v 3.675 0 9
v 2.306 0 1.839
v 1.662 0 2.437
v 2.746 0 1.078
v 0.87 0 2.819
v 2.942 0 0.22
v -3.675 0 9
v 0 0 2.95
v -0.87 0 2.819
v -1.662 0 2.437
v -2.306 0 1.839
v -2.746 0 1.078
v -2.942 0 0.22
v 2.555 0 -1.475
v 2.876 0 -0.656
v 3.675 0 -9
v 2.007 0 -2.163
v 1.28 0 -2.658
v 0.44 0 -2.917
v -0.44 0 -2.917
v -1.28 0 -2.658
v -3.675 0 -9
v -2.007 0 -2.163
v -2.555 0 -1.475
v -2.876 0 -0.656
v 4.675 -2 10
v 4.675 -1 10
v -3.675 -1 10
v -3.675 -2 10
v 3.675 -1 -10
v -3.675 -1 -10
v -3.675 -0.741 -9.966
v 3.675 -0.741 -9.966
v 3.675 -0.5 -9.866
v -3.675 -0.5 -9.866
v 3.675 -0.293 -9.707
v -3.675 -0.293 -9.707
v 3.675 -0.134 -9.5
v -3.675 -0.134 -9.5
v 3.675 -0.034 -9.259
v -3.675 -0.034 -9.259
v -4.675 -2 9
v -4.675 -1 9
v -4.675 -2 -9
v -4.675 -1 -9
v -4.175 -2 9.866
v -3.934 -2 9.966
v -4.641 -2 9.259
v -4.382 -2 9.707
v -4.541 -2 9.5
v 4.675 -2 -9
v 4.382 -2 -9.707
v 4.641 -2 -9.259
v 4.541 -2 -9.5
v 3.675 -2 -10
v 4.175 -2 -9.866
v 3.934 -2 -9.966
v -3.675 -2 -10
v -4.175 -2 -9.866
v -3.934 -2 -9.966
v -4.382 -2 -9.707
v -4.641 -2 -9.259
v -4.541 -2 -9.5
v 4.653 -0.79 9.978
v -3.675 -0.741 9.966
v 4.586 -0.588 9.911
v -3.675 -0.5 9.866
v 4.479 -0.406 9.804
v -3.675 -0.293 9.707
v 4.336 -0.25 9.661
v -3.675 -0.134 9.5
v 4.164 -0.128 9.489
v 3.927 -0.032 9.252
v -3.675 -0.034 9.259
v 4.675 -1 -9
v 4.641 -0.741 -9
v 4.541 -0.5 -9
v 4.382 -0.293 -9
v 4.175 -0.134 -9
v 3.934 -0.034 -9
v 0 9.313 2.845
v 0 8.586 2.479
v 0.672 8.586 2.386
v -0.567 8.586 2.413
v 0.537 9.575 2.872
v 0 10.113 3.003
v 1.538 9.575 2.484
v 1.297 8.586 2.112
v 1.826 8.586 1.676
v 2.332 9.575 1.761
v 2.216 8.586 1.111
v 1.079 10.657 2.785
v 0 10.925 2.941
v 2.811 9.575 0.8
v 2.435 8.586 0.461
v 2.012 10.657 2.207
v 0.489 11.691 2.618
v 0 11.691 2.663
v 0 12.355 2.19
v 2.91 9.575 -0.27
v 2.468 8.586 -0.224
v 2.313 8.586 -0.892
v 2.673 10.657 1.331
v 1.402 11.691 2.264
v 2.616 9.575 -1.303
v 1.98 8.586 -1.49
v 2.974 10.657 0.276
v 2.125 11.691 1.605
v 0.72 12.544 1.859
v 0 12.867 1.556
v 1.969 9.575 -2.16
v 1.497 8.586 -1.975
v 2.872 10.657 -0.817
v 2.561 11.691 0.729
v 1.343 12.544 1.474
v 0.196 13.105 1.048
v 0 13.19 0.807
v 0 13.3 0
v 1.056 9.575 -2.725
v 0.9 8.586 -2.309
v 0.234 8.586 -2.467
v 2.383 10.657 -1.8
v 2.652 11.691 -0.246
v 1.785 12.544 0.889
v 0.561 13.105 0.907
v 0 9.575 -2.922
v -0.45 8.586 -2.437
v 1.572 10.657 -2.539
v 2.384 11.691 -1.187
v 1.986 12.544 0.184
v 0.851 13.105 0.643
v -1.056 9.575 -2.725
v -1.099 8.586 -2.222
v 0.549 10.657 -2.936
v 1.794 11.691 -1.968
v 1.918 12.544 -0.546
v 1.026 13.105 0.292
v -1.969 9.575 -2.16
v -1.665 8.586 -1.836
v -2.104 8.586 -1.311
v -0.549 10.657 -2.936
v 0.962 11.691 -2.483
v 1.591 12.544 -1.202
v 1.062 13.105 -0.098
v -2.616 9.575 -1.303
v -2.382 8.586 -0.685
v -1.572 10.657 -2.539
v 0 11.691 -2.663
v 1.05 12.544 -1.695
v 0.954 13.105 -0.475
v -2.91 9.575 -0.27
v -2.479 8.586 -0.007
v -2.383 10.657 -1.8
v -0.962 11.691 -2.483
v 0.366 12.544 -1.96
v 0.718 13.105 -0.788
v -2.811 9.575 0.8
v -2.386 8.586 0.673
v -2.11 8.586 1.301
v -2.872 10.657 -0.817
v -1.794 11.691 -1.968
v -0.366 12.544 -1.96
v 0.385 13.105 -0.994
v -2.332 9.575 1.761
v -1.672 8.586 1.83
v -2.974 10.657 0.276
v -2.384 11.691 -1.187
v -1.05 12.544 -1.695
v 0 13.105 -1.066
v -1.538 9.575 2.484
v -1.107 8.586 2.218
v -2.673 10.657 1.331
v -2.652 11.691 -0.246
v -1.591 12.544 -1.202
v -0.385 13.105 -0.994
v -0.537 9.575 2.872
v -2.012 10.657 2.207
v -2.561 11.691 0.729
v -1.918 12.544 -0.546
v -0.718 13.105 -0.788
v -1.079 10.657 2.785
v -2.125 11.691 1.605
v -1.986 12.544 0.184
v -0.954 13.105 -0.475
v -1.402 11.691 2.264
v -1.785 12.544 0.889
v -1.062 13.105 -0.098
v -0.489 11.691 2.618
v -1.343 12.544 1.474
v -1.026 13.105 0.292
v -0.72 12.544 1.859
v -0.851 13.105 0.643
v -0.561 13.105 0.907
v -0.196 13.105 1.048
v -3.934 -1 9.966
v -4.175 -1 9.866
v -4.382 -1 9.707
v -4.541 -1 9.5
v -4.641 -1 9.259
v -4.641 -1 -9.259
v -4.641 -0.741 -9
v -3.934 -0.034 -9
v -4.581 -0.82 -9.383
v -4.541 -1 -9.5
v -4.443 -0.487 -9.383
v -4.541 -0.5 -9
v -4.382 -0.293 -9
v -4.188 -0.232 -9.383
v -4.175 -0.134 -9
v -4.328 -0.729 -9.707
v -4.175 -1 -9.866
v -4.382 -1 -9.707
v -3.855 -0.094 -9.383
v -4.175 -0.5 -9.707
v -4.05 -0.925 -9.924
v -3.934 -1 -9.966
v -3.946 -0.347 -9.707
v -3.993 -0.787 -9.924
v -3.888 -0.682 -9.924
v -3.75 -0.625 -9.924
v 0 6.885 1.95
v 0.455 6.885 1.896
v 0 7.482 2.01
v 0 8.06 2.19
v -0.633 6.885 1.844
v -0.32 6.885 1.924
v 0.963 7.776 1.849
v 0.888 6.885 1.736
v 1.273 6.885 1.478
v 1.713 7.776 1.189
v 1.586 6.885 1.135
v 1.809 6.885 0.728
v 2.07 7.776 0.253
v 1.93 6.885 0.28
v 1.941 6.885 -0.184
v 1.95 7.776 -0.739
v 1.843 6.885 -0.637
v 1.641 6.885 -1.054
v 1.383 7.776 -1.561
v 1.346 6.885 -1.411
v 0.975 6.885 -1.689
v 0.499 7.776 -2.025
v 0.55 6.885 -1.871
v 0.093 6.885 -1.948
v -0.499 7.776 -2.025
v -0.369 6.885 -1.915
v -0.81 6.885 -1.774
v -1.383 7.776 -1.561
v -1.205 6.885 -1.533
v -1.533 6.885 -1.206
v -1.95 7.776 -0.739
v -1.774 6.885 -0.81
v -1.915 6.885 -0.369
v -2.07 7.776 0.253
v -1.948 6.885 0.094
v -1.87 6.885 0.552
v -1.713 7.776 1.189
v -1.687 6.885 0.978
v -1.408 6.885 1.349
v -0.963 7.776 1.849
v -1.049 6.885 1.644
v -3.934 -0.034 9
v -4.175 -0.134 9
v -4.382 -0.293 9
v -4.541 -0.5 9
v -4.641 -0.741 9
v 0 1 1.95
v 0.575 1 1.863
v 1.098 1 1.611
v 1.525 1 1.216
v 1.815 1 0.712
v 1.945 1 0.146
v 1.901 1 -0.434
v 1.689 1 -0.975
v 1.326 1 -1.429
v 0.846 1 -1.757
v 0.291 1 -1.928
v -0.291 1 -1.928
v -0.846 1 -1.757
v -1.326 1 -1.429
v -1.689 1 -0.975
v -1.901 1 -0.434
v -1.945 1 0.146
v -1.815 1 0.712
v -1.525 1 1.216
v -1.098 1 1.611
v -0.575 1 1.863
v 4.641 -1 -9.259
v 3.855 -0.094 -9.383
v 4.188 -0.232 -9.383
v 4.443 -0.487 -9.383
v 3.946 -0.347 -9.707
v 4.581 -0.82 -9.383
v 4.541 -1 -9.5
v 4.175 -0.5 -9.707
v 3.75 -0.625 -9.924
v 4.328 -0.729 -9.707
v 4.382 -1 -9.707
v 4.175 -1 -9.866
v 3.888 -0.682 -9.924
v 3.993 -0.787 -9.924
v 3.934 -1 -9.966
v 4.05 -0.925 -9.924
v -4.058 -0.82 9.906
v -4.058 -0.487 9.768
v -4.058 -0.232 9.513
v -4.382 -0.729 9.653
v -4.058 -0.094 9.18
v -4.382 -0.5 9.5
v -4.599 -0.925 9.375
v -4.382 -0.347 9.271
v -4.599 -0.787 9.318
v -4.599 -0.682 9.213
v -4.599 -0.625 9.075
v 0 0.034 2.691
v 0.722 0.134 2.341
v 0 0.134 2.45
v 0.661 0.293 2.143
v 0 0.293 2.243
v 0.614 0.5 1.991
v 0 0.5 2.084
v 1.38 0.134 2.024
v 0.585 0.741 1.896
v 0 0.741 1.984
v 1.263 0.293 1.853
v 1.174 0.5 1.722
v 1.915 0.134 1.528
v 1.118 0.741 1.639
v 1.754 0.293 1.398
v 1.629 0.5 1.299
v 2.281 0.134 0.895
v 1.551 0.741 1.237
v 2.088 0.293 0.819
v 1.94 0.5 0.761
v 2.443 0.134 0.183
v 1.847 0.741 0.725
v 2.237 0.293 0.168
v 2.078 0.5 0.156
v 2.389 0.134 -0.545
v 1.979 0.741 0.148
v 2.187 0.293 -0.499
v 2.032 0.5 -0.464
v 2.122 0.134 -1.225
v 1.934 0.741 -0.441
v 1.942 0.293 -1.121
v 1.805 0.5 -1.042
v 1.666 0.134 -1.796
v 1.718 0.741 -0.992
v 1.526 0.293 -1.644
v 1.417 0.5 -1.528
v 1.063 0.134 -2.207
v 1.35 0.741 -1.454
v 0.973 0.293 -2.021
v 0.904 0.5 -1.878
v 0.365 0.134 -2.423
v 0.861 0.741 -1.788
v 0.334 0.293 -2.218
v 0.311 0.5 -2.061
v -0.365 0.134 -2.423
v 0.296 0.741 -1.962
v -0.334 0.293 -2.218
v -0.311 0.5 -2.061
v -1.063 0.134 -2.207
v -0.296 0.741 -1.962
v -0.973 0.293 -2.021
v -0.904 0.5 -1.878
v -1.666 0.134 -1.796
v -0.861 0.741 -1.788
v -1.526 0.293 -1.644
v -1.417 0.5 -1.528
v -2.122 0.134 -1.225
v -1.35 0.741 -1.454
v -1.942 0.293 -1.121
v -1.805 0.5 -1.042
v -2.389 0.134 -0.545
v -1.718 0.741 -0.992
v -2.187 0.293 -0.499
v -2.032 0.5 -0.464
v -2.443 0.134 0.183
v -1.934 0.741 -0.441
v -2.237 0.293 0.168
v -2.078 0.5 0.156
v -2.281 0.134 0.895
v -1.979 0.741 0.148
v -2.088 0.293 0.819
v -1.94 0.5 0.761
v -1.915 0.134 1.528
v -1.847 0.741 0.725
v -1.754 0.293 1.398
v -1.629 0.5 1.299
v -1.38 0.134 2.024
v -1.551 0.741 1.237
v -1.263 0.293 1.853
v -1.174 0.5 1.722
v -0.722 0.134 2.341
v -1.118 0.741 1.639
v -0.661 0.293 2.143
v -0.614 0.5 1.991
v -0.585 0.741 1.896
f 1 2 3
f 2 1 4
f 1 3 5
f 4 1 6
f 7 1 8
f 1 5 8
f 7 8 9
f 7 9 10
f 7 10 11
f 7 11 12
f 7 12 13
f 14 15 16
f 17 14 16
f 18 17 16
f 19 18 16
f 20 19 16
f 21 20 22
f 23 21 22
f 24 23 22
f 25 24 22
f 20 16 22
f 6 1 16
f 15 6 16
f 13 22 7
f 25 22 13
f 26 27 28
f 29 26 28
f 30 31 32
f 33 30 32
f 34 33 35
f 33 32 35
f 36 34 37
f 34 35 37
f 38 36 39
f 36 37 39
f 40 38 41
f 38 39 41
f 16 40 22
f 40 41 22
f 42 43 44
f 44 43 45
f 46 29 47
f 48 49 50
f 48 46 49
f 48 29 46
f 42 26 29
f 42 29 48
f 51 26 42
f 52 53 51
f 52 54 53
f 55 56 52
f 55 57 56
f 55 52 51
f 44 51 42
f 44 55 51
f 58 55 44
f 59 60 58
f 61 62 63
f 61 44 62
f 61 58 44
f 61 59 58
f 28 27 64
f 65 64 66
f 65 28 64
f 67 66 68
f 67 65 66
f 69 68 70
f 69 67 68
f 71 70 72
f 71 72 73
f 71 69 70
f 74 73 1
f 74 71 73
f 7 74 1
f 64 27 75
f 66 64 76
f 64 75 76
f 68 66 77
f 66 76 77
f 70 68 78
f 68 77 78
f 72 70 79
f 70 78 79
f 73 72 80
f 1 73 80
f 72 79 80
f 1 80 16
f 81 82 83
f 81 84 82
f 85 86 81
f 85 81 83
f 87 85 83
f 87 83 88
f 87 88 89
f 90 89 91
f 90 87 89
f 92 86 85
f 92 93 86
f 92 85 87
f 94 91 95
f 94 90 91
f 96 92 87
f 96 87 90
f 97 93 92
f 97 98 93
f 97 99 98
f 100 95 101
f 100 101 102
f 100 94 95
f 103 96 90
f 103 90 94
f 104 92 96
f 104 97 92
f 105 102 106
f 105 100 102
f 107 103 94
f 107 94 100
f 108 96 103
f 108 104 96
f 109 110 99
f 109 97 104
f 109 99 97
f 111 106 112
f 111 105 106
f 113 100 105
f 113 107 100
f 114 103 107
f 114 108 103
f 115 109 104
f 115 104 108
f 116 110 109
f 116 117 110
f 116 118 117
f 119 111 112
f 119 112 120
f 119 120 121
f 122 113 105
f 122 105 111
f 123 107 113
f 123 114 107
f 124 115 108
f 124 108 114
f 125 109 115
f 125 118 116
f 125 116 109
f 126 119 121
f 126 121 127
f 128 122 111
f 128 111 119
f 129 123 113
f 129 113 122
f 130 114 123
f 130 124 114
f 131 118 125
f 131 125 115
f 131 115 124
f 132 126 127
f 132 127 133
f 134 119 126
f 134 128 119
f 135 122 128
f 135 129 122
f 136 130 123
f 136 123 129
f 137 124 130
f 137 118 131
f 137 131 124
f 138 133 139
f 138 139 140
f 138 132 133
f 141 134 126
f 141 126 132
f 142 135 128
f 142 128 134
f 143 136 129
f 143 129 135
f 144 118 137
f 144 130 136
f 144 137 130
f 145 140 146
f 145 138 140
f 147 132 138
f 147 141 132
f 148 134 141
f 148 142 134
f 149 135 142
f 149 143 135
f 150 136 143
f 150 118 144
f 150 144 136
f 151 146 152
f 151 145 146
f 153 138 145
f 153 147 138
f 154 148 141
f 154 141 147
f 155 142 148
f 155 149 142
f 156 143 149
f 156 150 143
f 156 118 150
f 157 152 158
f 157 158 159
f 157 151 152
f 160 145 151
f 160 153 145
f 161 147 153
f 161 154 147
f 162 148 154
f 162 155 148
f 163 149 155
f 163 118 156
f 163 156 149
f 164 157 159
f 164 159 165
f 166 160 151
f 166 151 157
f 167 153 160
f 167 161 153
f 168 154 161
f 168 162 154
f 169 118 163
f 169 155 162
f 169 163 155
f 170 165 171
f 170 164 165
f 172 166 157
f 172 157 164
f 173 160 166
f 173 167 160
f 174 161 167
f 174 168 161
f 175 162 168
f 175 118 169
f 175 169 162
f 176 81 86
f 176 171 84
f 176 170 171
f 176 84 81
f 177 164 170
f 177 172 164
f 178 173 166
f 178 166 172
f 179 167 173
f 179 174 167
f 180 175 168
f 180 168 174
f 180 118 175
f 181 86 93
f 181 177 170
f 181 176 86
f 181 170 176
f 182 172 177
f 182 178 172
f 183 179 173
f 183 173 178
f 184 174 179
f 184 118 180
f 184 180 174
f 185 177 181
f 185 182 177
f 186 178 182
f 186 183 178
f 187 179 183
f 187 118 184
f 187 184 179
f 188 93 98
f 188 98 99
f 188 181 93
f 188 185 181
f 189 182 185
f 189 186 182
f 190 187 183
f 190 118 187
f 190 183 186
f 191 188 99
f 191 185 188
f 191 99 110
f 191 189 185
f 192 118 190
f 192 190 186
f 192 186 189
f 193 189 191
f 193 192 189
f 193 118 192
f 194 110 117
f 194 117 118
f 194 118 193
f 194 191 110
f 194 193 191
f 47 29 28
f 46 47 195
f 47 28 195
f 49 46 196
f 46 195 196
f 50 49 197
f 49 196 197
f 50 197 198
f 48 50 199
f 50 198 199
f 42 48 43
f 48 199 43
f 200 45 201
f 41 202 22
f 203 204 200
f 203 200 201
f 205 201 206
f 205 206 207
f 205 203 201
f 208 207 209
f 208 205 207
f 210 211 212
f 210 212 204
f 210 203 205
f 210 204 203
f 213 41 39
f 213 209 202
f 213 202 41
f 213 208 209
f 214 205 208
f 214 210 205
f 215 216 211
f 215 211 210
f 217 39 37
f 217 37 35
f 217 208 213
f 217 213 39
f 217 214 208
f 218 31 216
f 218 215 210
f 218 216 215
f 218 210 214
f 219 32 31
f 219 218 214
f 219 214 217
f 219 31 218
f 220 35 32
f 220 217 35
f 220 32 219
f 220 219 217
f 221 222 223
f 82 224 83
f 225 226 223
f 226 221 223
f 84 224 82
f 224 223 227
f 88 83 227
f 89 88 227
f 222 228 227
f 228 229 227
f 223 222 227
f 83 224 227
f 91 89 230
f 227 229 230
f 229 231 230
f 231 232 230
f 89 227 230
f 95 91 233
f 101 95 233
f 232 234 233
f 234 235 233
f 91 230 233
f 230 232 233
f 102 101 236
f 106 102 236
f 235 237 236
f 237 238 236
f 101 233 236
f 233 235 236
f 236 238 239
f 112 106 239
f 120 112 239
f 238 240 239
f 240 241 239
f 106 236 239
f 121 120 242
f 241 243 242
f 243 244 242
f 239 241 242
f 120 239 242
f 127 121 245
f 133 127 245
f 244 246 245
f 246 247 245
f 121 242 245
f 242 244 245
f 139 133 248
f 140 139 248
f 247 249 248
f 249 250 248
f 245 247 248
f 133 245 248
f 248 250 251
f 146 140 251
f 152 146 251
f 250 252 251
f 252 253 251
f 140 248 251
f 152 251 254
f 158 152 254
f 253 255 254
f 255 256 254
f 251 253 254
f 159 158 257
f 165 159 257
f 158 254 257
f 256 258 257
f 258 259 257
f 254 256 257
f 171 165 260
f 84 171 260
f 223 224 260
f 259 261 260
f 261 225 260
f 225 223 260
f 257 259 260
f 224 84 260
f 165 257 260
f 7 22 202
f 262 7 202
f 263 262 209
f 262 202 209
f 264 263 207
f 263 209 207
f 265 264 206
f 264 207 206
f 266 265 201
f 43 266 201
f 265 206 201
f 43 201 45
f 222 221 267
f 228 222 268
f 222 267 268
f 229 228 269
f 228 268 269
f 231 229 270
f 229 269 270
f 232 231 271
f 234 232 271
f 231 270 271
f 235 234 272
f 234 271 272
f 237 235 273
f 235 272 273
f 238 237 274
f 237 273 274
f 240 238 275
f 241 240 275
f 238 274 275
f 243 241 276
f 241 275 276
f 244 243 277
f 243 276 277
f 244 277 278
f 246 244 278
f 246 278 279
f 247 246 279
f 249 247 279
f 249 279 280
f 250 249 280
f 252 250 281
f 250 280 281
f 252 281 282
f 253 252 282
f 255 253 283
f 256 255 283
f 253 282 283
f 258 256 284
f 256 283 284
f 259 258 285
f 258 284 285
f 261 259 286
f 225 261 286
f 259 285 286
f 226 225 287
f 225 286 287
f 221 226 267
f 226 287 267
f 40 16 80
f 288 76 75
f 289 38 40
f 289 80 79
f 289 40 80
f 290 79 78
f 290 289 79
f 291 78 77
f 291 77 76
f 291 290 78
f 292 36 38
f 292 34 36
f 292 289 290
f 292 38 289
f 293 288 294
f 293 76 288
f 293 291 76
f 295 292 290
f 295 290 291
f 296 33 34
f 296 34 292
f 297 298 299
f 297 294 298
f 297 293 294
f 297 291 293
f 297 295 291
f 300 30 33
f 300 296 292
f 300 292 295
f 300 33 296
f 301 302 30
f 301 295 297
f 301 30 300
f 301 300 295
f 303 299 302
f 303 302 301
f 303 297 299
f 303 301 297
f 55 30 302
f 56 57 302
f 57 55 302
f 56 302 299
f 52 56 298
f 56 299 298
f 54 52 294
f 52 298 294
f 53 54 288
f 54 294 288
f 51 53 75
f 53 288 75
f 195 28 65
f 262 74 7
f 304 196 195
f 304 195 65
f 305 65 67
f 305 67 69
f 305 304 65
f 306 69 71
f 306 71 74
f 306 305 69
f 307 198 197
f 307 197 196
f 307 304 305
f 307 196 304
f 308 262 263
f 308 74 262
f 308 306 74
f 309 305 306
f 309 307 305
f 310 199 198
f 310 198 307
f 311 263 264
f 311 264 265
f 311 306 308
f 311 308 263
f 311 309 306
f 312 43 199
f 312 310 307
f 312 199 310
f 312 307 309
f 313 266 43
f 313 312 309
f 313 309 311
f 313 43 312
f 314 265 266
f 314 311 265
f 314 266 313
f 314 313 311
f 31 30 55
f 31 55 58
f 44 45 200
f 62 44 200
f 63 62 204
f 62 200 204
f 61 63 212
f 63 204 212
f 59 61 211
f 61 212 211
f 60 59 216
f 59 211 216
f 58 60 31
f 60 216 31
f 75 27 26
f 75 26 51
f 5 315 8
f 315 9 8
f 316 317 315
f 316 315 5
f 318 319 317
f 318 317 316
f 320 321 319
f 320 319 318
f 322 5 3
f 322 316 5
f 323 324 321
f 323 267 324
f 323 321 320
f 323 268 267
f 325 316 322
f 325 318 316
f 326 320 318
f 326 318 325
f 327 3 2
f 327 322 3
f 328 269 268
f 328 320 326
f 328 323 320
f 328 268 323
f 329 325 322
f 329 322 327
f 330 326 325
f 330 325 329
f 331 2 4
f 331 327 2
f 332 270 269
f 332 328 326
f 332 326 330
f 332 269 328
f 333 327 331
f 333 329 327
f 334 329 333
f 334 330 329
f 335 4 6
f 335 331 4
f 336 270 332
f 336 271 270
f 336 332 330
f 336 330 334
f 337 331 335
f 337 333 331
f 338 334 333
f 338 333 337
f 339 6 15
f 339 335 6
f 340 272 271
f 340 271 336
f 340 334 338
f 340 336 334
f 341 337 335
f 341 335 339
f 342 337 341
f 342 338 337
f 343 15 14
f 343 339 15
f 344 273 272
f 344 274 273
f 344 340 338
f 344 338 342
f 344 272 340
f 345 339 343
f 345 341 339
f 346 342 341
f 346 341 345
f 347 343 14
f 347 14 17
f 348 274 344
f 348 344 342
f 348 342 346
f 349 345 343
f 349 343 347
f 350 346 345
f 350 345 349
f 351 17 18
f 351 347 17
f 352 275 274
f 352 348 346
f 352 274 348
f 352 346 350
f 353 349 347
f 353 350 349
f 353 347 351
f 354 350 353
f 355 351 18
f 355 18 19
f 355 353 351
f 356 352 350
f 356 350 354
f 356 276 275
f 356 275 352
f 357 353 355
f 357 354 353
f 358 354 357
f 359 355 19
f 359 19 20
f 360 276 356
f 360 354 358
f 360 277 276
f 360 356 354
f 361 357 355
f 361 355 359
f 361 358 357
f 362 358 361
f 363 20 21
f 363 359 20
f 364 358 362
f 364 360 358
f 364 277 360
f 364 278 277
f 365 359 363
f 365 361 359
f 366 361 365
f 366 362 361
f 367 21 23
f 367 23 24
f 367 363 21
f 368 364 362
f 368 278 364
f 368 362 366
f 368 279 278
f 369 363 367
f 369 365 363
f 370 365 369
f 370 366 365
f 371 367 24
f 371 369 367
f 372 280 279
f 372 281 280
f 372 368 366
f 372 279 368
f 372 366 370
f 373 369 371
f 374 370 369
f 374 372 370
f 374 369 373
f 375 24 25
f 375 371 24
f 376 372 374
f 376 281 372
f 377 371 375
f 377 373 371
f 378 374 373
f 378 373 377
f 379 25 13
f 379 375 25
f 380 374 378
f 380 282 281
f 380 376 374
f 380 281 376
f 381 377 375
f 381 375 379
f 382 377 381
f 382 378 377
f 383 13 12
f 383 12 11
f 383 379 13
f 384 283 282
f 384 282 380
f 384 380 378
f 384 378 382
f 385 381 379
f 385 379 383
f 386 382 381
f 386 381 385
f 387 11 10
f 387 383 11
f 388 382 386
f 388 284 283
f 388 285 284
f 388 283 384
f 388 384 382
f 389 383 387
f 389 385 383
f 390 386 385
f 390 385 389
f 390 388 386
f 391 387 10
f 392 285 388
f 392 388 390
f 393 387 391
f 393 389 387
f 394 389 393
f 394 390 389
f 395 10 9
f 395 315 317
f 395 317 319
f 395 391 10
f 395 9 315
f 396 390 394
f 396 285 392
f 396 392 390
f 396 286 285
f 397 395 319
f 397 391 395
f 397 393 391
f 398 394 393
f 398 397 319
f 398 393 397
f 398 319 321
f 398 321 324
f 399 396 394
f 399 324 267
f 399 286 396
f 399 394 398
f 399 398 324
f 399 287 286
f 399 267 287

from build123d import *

# Parameters (mm, degrees)
CROQUIS2_R              = 1.95
SALIENTE_EXTRUIR1_DEPTH = 8
C_PULA1_FACE_RADIUS     = 1.95
C_PULA1_HEIGHT          = 5.3
CROQUIS11_W             = 9.35
CROQUIS11_H             = 20
SALIENTE_EXTRUIR3_DEPTH = 2
FILLET1_R               = 1
FILLET2_R               = 1
FILLET3_R               = 3


with BuildPart() as part:
    # Croquis2 → Saliente-Extruir1 (new body)
    with BuildSketch(Plane(origin=(0, 0, 0), x_dir=(1, 0, 0), z_dir=(0, 1, 0))):
        with Locations(Location((0, 0, 0), (0, 0, 270))):
            Circle(CROQUIS2_R)
    extrude(amount=SALIENTE_EXTRUIR1_DEPTH)

    # Cúpula1: a dome of height H over a round flat face of radius A is a cap of a sphere of radius (A * A + H * H) / (2 * H)
    c_pula1_r = (C_PULA1_FACE_RADIUS * C_PULA1_FACE_RADIUS + C_PULA1_HEIGHT * C_PULA1_HEIGHT) / (2 * C_PULA1_HEIGHT)
    c_pula1_base = Plane((0, 8, 0), z_dir=(0, 1, 0))
    with Locations(c_pula1_base.offset(C_PULA1_HEIGHT - c_pula1_r)):
        c_pula1_ball = Sphere(c_pula1_r, mode=Mode.PRIVATE)
    add(split(c_pula1_ball, bisect_by=c_pula1_base, keep=Keep.TOP, mode=Mode.PRIVATE))

    # Croquis11 → Saliente-Extruir3 (add)
    with BuildSketch(Plane(origin=(0, 0, 0), x_dir=(-1, 0, 0), z_dir=(0, -1, 0))):
        Rectangle(CROQUIS11_W, CROQUIS11_H)
    extrude(amount=SALIENTE_EXTRUIR3_DEPTH)

    # Fillet1
    fillet1_edges = [part.edges().sort_by_distance(p)[0] for p in [
        (0, 0, -1.95),
        (0, 0, -10),
        (4.675, 0, 0),
        (-4.675, 0, 0),
        (0, 0, 10),
    ]]
    fillet(fillet1_edges, radius=FILLET1_R)

    # Fillet2
    # the kernel refuses this fillet: 1 mm, written as the material it takes off along each edge
    with BuildSketch(Plane(origin=(-3.675, -1, 9), x_dir=(0, 0, 1), z_dir=(-1, 0, 0))) as fillet2_piece_1_section:
        Polygon((0, 0), (FILLET2_R, 0), (FILLET2_R, FILLET2_R), (0, FILLET2_R), align=None)
    fillet2_piece_1 = extrude(amount=FILLET2_R, mode=Mode.PRIVATE)
    fillet2_piece_1 = fillet2_piece_1 - Plane(origin=(-3.675, -1, 9), x_dir=(0, -0.7071067811865475, -0.7071067811865475), z_dir=(-1, 0, 0)) * Sphere(FILLET2_R, mode=Mode.PRIVATE)
    add(fillet2_piece_1, mode=Mode.SUBTRACT)
    with BuildSketch(Plane(origin=(-3.675, -1, -9), x_dir=(-1, 0, 0), z_dir=(0, 0, -1))) as fillet2_piece_2_section:
        Polygon((0, 0), (FILLET2_R, 0), (FILLET2_R, FILLET2_R), (0, FILLET2_R), align=None)
    fillet2_piece_2 = extrude(amount=FILLET2_R, mode=Mode.PRIVATE)
    fillet2_piece_2 = fillet2_piece_2 - Plane(origin=(-3.675, -1, -9), x_dir=(0.7071067811865475, -0.7071067811865475, 0), z_dir=(0, 0, -1)) * Sphere(FILLET2_R, mode=Mode.PRIVATE)
    add(fillet2_piece_2, mode=Mode.SUBTRACT)
    with BuildSketch(Plane(origin=(3.675, -1, -9), x_dir=(1, 0, 0), z_dir=(0, 0, -1))) as fillet2_piece_3_section:
        Polygon((0, 0), (FILLET2_R, 0), (FILLET2_R, -FILLET2_R), (0, -FILLET2_R), align=None)
    fillet2_piece_3 = extrude(amount=FILLET2_R, mode=Mode.PRIVATE)
    fillet2_piece_3 = fillet2_piece_3 - Plane(origin=(3.675, -1, -9), x_dir=(-0.7071067811865475, -0.7071067811865475, 0), z_dir=(0, 0, -1)) * Sphere(FILLET2_R, mode=Mode.PRIVATE)
    add(fillet2_piece_3, mode=Mode.SUBTRACT)
    with BuildSketch(Plane(origin=(-4.675, -1, 10), x_dir=(0, 0, -1), z_dir=(0, -1, 0)), Plane(origin=(-4.675, -1, -10), x_dir=(1, 0, 0), z_dir=(0, -1, 0))) as fillet2_piece_4:
        with BuildLine():
            CenterArc((FILLET2_R, FILLET2_R), FILLET2_R, 180, 90)
            Line((0, FILLET2_R), (0, 0))
            Line((0, 0), (FILLET2_R, 0))
        make_face()
    extrude(amount=3.5, mode=Mode.SUBTRACT)
    with BuildSketch(Plane(origin=(4.675, -1, -10), x_dir=(-1, 0, 0), z_dir=(0, -1, 0))) as fillet2_piece_5:
        with BuildLine():
            CenterArc((FILLET2_R, -FILLET2_R), FILLET2_R, 90, 90)
            Line((0, -FILLET2_R), (0, 0))
            Line((0, 0), (FILLET2_R, 0))
        make_face()
    extrude(amount=3.5, mode=Mode.SUBTRACT)

    # Fillet3
    fillet3_edges = [part.edges().sort_by_distance(p)[0] for p in [
        (0, 8, -1.95),
    ]]
    fillet(fillet3_edges, radius=FILLET3_R)


solid = part.part
